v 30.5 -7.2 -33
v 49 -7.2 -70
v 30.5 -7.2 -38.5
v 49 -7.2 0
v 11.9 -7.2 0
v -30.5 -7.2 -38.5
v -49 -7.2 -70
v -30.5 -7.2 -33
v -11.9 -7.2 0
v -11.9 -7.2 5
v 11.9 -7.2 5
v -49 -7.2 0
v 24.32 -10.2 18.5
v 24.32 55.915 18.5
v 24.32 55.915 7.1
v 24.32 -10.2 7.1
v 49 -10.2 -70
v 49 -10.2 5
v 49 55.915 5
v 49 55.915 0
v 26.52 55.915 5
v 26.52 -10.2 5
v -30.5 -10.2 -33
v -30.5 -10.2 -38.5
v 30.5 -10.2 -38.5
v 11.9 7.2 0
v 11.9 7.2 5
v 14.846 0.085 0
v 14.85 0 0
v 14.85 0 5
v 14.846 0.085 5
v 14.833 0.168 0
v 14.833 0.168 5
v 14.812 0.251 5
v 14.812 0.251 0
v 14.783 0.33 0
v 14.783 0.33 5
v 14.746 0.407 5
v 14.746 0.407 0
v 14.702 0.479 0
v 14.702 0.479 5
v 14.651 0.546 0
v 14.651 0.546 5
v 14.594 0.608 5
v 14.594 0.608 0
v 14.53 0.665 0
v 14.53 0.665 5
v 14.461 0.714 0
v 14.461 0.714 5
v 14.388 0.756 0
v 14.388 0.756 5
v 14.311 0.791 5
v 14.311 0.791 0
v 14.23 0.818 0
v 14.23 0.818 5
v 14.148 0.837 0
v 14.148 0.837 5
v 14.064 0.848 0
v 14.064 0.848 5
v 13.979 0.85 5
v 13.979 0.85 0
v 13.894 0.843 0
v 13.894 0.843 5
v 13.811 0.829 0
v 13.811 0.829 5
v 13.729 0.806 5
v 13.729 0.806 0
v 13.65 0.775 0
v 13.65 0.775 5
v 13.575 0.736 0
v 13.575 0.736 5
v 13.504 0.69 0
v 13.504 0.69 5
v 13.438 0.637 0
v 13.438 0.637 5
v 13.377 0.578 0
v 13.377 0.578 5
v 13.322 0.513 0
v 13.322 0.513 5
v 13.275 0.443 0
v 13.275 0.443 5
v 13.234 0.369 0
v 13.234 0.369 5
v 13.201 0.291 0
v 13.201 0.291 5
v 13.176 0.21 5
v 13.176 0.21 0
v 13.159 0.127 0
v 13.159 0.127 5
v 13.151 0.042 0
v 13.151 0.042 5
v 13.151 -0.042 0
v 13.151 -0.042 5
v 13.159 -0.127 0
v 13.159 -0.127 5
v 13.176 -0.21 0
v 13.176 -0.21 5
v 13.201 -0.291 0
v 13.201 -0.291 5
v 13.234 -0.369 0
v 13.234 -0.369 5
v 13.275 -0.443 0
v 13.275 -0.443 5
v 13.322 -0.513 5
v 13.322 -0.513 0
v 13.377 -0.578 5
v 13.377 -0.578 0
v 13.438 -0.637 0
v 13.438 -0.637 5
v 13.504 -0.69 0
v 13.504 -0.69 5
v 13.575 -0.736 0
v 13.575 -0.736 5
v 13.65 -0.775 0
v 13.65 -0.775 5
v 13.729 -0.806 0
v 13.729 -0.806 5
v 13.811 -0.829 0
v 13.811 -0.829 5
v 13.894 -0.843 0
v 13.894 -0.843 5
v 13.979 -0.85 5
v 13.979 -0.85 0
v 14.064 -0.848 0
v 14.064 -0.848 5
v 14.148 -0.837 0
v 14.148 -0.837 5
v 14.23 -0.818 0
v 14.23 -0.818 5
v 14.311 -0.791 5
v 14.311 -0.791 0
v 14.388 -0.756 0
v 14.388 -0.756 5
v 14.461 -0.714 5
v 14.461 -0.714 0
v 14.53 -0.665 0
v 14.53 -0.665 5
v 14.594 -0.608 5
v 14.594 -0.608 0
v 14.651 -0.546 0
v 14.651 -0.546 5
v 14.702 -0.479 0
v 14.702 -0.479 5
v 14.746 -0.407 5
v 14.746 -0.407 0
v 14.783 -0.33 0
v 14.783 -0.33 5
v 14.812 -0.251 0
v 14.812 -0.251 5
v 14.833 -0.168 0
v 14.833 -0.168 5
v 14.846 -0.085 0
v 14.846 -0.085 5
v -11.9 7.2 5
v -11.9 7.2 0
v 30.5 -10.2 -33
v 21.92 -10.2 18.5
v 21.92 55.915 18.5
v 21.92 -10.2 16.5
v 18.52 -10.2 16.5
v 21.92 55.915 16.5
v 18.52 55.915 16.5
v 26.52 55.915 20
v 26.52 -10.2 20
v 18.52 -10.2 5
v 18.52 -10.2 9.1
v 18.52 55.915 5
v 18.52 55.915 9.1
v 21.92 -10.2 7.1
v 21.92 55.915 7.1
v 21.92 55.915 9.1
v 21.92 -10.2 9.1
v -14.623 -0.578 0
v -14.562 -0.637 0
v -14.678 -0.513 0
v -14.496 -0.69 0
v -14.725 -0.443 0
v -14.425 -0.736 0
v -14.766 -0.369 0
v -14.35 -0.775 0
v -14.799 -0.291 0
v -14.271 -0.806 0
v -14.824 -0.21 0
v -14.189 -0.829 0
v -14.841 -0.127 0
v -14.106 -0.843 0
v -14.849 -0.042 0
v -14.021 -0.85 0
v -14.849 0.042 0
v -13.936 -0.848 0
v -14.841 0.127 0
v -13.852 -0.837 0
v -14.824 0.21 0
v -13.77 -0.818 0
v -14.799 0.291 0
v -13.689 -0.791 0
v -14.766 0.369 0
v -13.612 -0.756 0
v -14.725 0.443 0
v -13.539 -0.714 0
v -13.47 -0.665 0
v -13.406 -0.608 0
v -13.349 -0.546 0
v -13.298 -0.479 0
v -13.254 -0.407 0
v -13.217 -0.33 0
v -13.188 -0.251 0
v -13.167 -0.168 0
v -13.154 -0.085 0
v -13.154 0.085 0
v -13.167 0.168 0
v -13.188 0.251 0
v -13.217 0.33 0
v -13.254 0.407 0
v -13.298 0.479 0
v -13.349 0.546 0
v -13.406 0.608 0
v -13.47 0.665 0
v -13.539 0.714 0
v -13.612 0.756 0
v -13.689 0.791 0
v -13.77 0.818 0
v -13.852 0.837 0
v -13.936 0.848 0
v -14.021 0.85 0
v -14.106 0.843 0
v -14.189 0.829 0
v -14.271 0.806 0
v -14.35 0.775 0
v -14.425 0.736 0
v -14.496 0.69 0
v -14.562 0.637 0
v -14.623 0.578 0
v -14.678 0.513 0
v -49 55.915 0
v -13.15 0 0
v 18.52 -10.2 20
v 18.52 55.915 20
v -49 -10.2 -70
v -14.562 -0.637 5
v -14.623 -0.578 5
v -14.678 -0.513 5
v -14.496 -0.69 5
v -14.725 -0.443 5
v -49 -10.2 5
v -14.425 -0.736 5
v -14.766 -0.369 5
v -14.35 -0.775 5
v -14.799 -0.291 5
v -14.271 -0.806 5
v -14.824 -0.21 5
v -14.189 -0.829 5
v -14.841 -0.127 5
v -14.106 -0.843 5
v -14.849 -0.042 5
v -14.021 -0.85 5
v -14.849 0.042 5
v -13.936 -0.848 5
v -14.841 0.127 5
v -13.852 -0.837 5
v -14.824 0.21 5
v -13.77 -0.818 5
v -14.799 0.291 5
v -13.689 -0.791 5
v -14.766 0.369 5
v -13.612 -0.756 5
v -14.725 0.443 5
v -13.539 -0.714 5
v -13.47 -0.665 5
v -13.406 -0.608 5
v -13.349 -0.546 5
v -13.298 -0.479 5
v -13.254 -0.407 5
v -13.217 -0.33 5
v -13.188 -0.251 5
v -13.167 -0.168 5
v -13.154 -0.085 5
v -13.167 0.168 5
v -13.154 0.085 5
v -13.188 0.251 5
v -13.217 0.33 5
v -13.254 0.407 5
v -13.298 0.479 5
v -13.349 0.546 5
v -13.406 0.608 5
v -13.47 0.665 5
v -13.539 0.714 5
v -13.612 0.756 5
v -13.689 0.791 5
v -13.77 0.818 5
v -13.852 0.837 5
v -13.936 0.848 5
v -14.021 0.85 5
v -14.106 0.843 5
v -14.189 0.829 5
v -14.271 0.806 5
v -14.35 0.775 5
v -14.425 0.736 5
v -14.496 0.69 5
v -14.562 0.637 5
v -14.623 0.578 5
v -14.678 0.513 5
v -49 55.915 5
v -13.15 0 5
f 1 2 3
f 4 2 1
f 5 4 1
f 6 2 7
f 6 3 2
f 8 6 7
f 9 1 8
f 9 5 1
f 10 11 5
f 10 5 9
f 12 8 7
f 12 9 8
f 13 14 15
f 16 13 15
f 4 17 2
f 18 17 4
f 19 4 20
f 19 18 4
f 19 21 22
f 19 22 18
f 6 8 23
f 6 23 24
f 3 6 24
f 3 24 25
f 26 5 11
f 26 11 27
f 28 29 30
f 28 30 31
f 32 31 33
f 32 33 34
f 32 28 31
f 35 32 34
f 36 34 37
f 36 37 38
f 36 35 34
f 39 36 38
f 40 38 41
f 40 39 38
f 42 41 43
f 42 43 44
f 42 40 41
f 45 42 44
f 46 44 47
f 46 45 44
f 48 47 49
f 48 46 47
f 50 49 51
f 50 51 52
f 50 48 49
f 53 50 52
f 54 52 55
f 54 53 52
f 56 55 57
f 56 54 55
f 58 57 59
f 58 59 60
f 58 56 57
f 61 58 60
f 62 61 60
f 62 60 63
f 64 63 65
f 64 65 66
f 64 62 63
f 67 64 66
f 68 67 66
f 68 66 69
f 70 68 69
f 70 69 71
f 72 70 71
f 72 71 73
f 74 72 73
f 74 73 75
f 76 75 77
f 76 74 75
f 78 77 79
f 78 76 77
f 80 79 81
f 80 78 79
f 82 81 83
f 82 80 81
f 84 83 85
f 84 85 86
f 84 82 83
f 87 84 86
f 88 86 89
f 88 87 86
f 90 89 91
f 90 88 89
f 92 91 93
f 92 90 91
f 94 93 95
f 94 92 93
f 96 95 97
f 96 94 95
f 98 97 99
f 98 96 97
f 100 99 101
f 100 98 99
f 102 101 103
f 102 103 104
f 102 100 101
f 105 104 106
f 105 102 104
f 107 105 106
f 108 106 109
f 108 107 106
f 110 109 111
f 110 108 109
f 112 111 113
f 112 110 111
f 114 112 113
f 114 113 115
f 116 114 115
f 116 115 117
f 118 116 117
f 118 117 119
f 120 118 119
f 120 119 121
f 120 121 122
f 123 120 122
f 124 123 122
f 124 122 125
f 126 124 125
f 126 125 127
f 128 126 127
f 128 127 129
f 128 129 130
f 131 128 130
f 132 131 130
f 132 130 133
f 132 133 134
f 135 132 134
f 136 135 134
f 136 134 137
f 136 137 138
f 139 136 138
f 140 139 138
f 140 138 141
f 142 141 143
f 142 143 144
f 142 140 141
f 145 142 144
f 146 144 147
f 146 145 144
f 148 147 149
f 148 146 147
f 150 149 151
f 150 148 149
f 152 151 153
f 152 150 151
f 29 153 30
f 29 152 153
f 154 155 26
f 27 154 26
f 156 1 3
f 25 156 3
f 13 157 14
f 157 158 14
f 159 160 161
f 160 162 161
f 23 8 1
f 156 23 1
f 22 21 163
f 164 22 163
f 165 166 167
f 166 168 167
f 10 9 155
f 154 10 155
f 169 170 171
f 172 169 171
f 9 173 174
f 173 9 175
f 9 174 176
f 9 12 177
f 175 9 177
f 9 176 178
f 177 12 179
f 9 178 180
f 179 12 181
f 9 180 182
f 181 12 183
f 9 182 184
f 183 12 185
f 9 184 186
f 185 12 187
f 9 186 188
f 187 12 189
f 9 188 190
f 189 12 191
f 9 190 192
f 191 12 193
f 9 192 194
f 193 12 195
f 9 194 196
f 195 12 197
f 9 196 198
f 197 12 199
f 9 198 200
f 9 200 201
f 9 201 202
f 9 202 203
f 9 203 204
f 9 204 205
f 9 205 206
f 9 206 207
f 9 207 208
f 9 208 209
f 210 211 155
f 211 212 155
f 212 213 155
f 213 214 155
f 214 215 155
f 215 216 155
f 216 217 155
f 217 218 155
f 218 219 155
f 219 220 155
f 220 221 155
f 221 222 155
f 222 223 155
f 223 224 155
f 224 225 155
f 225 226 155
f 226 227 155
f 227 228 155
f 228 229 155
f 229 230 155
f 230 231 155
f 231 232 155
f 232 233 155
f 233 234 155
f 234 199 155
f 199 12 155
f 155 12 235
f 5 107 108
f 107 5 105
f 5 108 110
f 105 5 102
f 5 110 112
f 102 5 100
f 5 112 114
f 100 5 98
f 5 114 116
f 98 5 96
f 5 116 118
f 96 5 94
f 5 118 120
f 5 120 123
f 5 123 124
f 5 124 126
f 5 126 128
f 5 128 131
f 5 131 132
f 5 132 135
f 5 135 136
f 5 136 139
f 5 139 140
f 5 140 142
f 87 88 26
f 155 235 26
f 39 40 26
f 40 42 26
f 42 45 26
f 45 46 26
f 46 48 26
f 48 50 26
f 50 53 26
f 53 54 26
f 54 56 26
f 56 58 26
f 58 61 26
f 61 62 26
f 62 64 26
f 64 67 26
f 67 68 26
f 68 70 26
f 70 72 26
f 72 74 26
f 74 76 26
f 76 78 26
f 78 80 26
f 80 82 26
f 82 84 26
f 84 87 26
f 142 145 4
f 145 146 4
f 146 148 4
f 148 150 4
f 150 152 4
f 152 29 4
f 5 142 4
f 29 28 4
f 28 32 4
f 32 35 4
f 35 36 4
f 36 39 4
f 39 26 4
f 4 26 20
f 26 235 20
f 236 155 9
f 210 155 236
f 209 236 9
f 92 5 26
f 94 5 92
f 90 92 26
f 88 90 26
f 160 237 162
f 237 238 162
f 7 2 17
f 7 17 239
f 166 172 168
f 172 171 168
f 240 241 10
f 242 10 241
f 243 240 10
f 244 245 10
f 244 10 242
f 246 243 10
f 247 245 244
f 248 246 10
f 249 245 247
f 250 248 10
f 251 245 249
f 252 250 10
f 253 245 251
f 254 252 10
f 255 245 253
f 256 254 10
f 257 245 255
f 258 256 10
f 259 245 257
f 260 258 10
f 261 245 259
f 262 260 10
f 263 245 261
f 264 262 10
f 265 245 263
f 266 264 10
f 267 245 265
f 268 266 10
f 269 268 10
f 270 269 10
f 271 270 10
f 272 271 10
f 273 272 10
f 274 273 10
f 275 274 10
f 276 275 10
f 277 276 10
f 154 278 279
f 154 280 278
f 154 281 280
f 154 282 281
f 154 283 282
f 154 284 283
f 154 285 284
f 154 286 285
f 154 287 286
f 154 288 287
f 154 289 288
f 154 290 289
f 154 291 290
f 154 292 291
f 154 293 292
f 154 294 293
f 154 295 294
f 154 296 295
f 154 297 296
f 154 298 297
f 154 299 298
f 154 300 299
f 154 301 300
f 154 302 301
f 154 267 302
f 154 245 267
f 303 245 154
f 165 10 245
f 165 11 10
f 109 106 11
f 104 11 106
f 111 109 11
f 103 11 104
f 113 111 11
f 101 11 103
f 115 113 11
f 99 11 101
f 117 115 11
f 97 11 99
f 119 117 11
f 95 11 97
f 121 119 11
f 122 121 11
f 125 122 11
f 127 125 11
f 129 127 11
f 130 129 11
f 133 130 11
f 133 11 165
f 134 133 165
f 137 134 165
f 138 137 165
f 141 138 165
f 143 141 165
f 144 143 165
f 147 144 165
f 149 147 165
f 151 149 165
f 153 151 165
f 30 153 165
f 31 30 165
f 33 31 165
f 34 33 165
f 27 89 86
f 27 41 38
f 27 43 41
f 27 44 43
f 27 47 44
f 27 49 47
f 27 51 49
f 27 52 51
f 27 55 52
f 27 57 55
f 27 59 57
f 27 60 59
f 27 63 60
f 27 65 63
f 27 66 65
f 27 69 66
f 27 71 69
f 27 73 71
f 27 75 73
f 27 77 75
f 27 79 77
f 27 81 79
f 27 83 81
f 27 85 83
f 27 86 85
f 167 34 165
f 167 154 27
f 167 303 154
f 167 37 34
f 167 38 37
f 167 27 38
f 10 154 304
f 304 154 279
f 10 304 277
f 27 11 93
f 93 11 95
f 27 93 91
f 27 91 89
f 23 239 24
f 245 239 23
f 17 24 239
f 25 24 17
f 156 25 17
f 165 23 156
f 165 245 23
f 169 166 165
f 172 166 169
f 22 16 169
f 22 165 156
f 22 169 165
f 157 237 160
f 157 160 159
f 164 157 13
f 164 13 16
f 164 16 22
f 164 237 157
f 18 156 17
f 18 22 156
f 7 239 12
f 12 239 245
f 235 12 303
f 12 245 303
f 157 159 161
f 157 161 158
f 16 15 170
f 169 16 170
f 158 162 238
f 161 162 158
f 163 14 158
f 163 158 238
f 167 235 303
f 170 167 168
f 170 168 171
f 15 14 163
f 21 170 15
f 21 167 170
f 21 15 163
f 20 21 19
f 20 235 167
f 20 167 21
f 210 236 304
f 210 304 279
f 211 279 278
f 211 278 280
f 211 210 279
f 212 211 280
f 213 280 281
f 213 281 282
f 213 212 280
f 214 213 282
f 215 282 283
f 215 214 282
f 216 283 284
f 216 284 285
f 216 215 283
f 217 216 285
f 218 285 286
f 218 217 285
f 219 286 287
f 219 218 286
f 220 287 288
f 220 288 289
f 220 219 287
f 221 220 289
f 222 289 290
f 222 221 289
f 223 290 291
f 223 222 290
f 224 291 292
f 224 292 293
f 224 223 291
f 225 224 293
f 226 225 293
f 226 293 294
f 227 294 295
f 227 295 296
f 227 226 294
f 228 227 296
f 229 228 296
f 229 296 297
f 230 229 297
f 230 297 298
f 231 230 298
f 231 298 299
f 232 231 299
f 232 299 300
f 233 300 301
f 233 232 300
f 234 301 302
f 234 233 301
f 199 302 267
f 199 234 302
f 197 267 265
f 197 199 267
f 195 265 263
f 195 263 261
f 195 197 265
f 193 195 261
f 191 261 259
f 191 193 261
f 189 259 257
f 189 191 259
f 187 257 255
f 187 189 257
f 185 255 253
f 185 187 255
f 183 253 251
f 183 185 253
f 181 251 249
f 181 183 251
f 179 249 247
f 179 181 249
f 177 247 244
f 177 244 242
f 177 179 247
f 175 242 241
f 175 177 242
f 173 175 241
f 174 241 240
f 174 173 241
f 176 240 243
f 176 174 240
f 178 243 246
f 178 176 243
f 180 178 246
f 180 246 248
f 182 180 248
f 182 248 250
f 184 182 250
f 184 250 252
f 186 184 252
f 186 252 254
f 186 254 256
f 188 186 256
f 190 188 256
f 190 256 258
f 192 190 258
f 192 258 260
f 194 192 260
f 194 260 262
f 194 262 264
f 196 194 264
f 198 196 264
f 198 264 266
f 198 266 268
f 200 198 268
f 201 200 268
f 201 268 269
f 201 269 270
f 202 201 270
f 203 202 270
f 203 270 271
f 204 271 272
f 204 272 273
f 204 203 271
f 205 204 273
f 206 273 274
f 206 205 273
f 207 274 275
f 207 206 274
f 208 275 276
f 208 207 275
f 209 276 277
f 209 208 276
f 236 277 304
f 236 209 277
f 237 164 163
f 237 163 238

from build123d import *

# Parameters (mm, degrees)
SKETCH1_W               = 98
SKETCH1_H               = 111.829224908
SKETCH1_R               = 0.85
SKETCH1_W_2             = 23.8
SKETCH1_H_2             = 14.4
BOSS_EXTRUDE1_DEPTH     = 5
SKETCH3_W               = 98
SKETCH3_H               = 3
BOSS_EXTRUDE2_DEPTH     = 70
SKETCH4_W               = 61
SKETCH4_H               = 5.5
CUT_EXTRUDE1_DEPTH      = 50
CUT_EXTRUDE2_DEPTH      = 103.114856343
CUT_EXTRUDE2_DEPTH_BACK = 103.114856343
SKETCH5_W               = 98
SKETCH5_H               = 45.714612454
SKETCH6_W               = 8
SKETCH6_H               = 60
BOSS_EXTRUDE3_DEPTH     = 15
CUT_EXTRUDE3_DEPTH      = 109.037687776
BOSS_EXTRUDE4_DEPTH     = 6.114612454


with BuildPart() as part:
    # Sketch1 → Boss-Extrude1 (new body)
    with BuildSketch(Plane.XY):
        Rectangle(SKETCH1_W, SKETCH1_H)
        with Locations((14, 0)):
            Circle(SKETCH1_R, mode=Mode.SUBTRACT)
        with Locations((-14, 0)):
            Circle(SKETCH1_R, mode=Mode.SUBTRACT)
        Rectangle(SKETCH1_W_2, SKETCH1_H_2, mode=Mode.SUBTRACT)
    extrude(amount=BOSS_EXTRUDE1_DEPTH)

    # Sketch3 → Boss-Extrude2 (add)
    with BuildSketch(Plane(origin=(0, 0, 0), x_dir=(-1, 0, 0), z_dir=(0, 0, -1))):
        with Locations((0, -8.7)):
            Rectangle(SKETCH3_W, SKETCH3_H)
    extrude(amount=BOSS_EXTRUDE2_DEPTH)

    # Sketch4 → Cut-Extrude1 (cut)
    with BuildSketch(Plane(origin=(0, -7.2, 0), x_dir=(1, 0, 0), z_dir=(0, 1, 0))):
        with Locations((0, 35.75)):
            Rectangle(SKETCH4_W, SKETCH4_H)
    extrude(amount=-CUT_EXTRUDE1_DEPTH, mode=Mode.SUBTRACT)

    # Sketch5 → Cut-Extrude2 (cut, two sides: drawn at the far end of the back side and taken through both)
    with BuildSketch(Plane(origin=(0, 0, 0), x_dir=(-1, 0, 0), z_dir=(0, 0, -1)).offset(-CUT_EXTRUDE2_DEPTH_BACK)):
        with Locations((0, -33.057306227)):
            Rectangle(SKETCH5_W, SKETCH5_H)
    extrude(amount=CUT_EXTRUDE2_DEPTH + CUT_EXTRUDE2_DEPTH_BACK, mode=Mode.SUBTRACT)

    # Sketch6 → Boss-Extrude3 (add)
    with BuildSketch(Plane.XY.offset(5)):
        with Locations((22.52, 25.914612454)):
            Rectangle(SKETCH6_W, SKETCH6_H)
    extrude(amount=BOSS_EXTRUDE3_DEPTH)

    # Sketch7 → Cut-Extrude3 (cut, through all)
    with BuildSketch(Plane(origin=(0, 55.914612454, 0), x_dir=(1, 0, 0), z_dir=(0, 1, 0))):
        Polygon((18.52, -9.1), (21.92, -9.1), (21.92, -7.1), (24.32, -7.1), (24.32, -18.5), (21.92, -18.5), (21.92, -16.5), (18.52, -16.5), align=None)
    extrude(amount=-CUT_EXTRUDE3_DEPTH, mode=Mode.SUBTRACT)

    # Sketch8 → Boss-Extrude4 (add)
    with BuildSketch(Plane.XZ.offset(4.085387546)):
        Polygon((21.92, 7.1), (21.92, 9.1), (18.52, 9.1), (18.52, 5), (26.52, 5), (26.52, 20), (18.52, 20), (18.52, 16.5), (21.92, 16.5), (21.92, 18.5), (24.32, 18.5), (24.32, 7.1), align=None)
    extrude(amount=BOSS_EXTRUDE4_DEPTH)


solid = part.part
